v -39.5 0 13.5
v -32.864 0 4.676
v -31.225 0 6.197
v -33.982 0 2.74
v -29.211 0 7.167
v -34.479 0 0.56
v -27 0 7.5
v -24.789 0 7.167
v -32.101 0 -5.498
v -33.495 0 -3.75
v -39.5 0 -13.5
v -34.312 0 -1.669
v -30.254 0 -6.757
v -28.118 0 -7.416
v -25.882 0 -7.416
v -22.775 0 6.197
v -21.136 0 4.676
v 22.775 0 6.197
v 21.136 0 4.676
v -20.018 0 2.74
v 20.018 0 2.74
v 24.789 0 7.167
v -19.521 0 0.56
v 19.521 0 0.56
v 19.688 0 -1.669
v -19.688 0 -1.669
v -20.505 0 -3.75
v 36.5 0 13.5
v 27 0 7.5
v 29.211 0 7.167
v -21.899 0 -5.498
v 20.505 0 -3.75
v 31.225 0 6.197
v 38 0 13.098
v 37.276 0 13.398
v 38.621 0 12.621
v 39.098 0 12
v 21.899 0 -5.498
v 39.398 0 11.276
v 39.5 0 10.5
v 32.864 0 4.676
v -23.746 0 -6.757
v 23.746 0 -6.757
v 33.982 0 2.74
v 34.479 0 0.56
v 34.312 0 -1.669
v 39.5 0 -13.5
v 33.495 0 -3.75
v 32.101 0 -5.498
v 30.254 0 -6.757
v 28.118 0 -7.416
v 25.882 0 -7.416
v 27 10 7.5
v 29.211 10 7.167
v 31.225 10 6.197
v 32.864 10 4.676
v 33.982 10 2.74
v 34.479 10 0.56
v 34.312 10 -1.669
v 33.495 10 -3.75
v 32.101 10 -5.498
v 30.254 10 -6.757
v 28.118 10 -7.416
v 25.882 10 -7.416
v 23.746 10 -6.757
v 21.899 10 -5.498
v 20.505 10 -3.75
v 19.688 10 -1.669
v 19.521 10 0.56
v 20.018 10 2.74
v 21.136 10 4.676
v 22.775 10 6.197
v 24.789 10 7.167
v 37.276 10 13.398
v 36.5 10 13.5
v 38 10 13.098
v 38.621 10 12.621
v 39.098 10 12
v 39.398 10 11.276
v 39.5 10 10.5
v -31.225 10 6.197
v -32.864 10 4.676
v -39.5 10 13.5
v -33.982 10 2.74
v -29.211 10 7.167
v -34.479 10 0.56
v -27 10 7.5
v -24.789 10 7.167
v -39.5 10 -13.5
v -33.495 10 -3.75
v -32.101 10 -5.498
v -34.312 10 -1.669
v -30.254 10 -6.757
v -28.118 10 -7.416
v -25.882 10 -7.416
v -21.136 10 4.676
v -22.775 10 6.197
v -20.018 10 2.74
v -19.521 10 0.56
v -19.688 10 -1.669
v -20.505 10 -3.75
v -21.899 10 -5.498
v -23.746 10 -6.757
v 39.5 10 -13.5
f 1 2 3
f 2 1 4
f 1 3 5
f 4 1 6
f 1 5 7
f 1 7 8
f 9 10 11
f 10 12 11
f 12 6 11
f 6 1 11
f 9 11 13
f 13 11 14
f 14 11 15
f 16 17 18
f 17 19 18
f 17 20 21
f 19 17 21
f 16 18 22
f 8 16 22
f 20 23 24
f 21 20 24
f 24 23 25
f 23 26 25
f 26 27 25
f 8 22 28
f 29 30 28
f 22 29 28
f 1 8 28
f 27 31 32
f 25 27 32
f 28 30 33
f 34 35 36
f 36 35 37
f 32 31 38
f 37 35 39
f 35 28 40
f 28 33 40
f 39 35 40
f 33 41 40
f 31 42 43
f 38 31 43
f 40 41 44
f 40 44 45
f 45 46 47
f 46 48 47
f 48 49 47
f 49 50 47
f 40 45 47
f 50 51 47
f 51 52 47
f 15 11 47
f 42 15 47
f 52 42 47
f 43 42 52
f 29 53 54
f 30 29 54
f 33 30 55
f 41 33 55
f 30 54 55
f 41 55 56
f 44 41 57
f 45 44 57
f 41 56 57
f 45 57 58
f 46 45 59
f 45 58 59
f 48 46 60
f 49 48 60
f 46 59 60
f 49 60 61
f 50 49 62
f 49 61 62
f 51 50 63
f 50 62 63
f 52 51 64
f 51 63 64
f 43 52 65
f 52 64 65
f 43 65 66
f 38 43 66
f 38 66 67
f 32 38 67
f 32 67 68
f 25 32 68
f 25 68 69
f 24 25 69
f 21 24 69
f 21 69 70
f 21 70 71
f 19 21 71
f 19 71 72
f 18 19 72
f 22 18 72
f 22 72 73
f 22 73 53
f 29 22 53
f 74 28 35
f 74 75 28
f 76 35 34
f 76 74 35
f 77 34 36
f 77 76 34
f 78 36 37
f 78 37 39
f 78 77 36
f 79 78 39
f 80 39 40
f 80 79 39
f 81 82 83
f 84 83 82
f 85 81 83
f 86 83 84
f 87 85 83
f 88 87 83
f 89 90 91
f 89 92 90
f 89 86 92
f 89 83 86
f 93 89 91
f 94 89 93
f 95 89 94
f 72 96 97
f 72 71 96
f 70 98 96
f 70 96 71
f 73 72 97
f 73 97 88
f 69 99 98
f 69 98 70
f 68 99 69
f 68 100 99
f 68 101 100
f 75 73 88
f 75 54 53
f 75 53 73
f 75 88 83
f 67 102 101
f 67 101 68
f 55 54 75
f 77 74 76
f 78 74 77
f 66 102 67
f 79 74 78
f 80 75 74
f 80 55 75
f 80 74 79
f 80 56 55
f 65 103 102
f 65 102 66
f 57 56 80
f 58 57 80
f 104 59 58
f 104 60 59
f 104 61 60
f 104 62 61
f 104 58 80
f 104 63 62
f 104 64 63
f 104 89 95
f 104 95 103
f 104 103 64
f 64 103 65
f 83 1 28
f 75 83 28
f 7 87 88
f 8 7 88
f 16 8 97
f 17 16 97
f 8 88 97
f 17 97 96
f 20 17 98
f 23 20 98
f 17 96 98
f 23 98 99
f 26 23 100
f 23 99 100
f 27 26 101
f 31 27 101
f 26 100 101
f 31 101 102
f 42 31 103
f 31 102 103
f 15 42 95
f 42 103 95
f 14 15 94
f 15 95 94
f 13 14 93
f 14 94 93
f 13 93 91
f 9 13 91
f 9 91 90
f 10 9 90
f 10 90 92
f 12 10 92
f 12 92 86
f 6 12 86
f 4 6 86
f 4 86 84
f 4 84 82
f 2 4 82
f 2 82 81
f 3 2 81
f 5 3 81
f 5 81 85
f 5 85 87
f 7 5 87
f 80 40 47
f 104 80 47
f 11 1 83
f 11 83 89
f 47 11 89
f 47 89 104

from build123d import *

# Parameters (mm, degrees)
SKETCH_1_W          = 79
SKETCH_1_H          = 27
EXTRUDE_1_DEPTH     = 10
SKETCH_3_R          = 7.5
CUT_EXTRUDE_1_DEPTH = 43.924352063
FILLET_1_R          = 3


with BuildPart() as part:
    # 草图1 → 凸台-拉伸1 (new body)
    with BuildSketch(Plane(origin=(0, 0, 0), x_dir=(1, 0, 0), z_dir=(0, 1, 0))):
        Rectangle(SKETCH_1_W, SKETCH_1_H)
    extrude(amount=EXTRUDE_1_DEPTH)

    # 草图3 → 切除-拉伸1 (cut, through all)
    with BuildSketch(Plane(origin=(0, 10, 0), x_dir=(1, 0, 0), z_dir=(0, 1, 0))):
        with Locations(Location((-27, 0, 0), (0, 0, 270))):
            Circle(SKETCH_3_R)
        with Locations(Location((27, 0, 0), (0, 0, 270))):
            Circle(SKETCH_3_R)
    extrude(amount=-CUT_EXTRUDE_1_DEPTH, mode=Mode.SUBTRACT)

    # 圆角1
    fillet_1_edges = [part.edges().sort_by_distance(p)[0] for p in [
        (39.5, 5, 13.5),
    ]]
    fillet(fillet_1_edges, radius=FILLET_1_R)


solid = part.part
